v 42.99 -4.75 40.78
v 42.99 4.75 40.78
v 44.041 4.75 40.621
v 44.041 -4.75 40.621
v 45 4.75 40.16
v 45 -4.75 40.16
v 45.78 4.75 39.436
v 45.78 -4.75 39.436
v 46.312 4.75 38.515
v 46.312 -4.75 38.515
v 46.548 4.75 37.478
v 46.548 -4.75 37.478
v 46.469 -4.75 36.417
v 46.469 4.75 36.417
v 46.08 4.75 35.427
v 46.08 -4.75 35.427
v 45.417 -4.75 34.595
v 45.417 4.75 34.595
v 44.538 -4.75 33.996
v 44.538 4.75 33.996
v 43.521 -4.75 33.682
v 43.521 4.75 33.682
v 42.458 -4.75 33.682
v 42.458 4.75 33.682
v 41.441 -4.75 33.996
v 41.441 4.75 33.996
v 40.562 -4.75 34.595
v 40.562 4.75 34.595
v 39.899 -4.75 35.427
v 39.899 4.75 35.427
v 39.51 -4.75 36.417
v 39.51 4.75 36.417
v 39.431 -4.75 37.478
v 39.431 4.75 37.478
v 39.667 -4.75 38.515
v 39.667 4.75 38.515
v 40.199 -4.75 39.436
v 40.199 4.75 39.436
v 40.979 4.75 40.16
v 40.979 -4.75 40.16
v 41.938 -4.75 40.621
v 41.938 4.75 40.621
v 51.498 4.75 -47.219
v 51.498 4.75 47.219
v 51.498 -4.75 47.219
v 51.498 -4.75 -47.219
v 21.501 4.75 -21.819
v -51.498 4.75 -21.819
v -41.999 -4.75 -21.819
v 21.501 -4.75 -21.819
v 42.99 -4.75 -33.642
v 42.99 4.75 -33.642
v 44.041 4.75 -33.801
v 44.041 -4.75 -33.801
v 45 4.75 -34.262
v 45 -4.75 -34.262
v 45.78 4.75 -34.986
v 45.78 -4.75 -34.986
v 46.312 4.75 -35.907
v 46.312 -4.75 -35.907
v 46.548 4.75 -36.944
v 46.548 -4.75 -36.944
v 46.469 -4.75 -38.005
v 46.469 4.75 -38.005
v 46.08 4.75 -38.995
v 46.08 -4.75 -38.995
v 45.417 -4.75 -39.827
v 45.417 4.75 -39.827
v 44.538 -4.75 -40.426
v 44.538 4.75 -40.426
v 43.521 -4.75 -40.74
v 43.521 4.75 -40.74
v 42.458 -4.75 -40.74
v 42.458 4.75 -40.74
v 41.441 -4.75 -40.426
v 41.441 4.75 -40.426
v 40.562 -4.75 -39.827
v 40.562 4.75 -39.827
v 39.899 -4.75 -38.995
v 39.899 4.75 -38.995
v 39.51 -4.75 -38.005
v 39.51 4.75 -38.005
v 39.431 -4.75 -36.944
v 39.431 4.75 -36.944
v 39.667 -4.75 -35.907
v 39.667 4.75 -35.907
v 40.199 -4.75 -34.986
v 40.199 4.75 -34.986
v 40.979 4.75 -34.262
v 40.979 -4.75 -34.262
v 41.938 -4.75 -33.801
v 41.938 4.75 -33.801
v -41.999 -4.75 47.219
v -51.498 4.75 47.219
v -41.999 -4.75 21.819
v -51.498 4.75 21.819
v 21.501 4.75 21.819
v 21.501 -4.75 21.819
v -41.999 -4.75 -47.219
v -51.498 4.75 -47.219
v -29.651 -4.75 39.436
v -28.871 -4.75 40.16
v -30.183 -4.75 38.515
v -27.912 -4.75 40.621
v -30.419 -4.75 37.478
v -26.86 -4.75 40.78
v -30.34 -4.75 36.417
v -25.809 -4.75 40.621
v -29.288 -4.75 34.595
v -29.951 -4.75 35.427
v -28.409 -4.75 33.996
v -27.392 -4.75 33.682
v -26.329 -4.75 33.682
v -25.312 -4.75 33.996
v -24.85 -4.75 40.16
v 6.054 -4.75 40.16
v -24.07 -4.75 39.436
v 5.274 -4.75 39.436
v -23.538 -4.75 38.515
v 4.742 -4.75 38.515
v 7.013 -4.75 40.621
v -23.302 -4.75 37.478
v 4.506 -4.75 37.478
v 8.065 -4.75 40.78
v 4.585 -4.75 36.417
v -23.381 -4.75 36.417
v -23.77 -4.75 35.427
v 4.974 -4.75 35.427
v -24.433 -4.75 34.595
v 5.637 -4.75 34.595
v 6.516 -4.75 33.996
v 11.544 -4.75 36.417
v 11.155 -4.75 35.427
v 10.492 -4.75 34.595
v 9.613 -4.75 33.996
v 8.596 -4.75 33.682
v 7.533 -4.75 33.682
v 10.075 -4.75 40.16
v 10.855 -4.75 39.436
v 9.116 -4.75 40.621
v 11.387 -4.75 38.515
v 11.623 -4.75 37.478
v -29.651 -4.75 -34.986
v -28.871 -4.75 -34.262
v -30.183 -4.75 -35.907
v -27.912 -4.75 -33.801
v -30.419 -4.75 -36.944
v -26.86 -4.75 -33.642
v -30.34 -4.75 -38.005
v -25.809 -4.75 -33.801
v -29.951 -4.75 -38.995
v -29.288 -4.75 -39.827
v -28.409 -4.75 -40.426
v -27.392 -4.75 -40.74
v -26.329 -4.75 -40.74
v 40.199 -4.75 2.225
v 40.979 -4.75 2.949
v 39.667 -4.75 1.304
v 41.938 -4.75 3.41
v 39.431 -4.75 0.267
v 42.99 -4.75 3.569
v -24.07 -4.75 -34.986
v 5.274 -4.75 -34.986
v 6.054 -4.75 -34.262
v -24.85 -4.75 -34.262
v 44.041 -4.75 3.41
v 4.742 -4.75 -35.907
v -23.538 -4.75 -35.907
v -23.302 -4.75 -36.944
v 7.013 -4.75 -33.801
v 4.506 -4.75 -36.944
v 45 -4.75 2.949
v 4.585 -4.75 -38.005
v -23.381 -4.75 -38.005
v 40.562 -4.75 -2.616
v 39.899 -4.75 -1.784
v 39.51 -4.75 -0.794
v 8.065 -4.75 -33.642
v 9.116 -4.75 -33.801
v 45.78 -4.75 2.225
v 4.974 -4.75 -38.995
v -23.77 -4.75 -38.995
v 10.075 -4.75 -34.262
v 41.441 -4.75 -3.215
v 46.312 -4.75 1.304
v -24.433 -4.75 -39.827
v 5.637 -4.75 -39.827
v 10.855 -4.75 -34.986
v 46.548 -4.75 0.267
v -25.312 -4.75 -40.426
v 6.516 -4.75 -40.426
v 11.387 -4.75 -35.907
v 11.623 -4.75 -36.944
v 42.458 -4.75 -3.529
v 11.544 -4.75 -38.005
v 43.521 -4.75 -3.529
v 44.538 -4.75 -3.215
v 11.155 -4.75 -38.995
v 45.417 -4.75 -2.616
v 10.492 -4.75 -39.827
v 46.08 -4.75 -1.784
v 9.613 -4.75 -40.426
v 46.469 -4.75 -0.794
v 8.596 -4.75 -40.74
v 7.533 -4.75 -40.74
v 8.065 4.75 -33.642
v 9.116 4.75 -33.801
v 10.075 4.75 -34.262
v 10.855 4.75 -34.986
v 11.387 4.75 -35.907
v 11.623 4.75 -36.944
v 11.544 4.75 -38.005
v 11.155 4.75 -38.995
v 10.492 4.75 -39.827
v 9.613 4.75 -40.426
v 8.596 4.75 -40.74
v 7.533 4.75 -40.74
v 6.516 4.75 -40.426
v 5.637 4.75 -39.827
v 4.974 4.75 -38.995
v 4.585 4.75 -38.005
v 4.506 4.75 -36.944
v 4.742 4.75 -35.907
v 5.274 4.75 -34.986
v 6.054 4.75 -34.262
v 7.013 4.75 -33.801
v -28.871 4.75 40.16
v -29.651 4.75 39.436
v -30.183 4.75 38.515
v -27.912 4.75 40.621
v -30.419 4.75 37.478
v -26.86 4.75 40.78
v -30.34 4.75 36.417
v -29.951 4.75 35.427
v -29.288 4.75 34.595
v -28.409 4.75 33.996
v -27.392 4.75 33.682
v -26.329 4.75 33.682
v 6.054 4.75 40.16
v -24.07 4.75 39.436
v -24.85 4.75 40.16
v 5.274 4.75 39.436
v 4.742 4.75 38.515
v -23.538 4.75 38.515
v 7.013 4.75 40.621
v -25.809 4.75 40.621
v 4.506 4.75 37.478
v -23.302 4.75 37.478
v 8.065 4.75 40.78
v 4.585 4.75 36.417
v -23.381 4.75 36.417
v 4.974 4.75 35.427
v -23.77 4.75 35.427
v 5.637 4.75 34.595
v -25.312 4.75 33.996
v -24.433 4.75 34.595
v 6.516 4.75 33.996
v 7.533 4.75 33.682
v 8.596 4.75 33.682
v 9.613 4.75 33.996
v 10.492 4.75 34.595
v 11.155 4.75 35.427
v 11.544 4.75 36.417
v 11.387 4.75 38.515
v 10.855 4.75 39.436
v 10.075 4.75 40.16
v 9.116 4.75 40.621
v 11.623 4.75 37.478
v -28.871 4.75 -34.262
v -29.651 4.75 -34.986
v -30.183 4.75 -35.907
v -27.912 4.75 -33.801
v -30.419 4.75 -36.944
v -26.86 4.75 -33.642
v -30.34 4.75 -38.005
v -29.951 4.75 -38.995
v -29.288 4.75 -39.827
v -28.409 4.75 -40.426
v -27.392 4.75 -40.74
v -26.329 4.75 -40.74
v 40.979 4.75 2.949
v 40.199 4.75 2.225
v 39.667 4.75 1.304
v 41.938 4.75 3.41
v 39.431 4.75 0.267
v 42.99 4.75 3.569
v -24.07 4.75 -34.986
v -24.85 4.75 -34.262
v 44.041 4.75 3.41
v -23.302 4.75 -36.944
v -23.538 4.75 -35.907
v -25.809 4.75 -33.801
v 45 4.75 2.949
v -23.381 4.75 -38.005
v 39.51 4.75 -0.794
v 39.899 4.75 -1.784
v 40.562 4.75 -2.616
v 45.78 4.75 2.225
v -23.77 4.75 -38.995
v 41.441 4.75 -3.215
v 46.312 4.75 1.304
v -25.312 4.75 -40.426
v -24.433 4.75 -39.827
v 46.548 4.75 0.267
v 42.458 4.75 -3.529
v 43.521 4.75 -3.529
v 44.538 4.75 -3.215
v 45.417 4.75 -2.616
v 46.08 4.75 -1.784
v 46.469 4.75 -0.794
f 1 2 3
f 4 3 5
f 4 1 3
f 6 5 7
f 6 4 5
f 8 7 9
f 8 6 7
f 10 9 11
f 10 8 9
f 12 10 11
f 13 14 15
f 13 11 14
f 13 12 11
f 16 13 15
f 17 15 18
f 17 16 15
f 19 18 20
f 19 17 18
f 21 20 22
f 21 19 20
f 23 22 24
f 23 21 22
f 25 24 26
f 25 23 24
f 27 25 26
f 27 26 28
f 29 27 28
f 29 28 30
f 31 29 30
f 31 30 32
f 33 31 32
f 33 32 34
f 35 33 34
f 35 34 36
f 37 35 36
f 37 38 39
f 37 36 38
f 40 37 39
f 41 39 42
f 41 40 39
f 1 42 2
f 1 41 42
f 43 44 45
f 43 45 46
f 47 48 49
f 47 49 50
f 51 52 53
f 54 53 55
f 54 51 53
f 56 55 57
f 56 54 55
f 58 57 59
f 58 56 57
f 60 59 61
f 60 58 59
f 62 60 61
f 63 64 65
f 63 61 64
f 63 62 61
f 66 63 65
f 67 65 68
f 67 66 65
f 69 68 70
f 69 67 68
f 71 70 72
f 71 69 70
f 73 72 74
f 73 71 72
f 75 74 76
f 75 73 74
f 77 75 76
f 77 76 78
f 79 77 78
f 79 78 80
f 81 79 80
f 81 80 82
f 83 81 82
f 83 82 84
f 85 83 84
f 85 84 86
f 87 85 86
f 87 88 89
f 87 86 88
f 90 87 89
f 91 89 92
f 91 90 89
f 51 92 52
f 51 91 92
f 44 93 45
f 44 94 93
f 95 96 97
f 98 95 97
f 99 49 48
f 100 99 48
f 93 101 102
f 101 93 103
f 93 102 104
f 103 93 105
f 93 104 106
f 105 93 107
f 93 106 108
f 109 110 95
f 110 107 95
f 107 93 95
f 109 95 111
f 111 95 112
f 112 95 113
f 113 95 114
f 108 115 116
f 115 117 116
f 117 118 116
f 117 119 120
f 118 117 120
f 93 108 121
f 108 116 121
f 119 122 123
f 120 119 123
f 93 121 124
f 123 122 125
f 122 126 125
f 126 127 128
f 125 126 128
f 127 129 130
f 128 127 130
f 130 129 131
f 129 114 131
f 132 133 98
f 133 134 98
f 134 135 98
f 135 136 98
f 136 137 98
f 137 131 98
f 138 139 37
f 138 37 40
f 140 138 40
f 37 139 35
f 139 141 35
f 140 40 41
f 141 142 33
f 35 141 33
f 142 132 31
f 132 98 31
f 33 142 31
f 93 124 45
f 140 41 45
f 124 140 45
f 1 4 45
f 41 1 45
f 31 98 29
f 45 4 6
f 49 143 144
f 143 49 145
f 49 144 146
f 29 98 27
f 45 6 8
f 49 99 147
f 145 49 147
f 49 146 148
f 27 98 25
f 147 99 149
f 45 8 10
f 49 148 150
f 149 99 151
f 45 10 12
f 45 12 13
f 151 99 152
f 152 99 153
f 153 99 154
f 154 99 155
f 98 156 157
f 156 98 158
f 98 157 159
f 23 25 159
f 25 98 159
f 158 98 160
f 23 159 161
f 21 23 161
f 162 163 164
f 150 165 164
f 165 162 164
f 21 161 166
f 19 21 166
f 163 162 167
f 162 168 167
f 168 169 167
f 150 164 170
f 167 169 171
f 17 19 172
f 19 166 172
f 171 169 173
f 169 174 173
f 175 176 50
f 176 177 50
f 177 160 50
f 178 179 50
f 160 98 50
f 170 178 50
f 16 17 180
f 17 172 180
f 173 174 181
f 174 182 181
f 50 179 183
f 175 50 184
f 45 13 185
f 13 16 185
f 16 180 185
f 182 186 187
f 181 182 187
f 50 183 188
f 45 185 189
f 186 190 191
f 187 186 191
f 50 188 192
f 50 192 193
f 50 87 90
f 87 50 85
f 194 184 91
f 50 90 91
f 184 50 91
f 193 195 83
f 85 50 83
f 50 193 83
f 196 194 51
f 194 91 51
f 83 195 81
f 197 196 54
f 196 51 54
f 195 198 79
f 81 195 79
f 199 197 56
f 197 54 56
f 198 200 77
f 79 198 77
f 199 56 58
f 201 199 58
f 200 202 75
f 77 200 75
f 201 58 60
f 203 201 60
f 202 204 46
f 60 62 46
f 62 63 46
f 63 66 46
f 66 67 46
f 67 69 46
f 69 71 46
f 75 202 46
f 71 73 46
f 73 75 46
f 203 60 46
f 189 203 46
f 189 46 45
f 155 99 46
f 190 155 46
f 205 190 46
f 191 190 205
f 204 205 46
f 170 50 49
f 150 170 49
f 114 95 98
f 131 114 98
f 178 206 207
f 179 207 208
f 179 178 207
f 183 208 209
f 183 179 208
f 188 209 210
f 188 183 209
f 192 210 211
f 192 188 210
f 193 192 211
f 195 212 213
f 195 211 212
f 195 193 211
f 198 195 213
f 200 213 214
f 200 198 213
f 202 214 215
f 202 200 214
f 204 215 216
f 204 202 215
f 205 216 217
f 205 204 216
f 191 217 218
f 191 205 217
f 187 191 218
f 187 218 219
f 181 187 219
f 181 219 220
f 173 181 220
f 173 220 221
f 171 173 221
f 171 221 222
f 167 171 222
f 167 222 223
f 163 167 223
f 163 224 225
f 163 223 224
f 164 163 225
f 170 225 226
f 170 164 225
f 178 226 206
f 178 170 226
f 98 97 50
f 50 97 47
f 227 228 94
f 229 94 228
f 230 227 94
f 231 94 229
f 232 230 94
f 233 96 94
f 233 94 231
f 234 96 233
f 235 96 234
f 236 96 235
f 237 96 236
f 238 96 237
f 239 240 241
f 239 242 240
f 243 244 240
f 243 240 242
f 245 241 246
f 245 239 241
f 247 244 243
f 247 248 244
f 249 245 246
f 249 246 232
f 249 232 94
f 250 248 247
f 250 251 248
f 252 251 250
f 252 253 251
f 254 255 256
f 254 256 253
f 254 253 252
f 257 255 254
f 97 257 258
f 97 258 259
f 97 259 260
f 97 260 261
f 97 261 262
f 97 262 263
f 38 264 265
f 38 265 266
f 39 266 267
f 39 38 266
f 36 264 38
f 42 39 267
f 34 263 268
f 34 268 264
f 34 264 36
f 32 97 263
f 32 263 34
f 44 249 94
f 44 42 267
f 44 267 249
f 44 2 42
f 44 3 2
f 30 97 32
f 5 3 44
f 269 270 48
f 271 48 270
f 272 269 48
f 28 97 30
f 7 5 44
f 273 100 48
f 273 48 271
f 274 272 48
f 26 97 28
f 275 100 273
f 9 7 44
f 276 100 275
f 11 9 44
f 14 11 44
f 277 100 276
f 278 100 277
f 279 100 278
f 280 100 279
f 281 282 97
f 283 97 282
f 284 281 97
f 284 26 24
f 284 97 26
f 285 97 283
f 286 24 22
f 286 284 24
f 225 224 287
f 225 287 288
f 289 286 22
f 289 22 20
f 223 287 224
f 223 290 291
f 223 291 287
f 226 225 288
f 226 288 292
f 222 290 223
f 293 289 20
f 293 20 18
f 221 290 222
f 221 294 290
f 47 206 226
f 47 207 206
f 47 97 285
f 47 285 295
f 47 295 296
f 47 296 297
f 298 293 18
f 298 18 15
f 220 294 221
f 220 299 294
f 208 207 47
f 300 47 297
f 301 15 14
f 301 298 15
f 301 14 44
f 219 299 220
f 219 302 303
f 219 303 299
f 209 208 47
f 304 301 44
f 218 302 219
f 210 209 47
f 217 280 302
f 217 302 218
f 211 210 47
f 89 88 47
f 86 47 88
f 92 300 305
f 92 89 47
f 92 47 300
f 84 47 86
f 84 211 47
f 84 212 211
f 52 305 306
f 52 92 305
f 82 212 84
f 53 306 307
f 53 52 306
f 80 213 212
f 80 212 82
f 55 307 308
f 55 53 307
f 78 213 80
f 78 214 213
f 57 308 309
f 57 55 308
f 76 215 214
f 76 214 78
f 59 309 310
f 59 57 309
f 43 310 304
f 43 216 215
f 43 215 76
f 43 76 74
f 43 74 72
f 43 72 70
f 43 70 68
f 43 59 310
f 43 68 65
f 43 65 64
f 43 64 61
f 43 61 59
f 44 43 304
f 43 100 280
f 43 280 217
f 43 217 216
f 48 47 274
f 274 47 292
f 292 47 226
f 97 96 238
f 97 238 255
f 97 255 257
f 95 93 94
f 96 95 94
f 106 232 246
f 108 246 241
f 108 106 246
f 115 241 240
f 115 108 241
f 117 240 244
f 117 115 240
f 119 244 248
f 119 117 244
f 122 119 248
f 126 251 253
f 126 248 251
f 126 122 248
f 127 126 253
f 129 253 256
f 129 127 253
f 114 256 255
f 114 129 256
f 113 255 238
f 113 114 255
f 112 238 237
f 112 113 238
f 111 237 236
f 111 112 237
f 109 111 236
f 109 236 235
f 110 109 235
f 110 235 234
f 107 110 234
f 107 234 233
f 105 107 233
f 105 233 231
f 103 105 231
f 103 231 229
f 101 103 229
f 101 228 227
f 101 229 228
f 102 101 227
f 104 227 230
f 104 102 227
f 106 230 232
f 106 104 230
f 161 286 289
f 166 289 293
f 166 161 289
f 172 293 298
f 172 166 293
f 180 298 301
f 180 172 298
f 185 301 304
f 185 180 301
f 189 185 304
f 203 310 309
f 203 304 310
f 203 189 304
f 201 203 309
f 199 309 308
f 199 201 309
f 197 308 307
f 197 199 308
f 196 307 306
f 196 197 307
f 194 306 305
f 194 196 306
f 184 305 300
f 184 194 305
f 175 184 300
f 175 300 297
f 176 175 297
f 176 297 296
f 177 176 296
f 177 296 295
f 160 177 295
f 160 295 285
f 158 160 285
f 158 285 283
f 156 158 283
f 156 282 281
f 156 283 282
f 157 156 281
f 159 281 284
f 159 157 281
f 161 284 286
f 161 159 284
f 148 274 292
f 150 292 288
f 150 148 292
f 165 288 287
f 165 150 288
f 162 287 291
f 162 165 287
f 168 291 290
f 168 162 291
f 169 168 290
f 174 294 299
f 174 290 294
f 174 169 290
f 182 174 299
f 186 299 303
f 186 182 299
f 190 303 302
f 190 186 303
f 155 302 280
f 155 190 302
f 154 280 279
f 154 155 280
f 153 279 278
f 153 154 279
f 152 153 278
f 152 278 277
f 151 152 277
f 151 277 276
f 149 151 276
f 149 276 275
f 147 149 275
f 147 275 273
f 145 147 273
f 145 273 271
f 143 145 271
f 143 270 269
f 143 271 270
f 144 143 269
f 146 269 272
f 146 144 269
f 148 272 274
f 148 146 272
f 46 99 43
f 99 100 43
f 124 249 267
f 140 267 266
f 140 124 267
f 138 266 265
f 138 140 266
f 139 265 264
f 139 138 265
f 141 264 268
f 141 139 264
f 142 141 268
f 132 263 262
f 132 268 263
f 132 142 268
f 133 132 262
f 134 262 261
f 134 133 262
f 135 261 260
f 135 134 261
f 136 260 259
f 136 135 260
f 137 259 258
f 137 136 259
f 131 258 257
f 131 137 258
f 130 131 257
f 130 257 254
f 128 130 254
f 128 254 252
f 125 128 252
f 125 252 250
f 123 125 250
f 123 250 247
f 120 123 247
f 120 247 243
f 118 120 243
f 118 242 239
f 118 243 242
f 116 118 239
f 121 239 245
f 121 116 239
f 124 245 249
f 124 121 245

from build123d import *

# Parameters (mm, degrees)
SKETCH1_W           = 102.997
SKETCH1_H           = 94.4372
BOSS_EXTRUDE1_DEPTH = 4.7498
CUT_EXTRUDE2_START  = 4.7498
SKETCH2_W           = 175.9966
SKETCH2_H           = 43.6372
CUT_EXTRUDE2_DEPTH  = 75.780166901
CUT_EXTRUDE6_START  = 47.2186
CUT_EXTRUDE6_DEPTH  = 118.248966901
CUT_EXTRUDE8_START  = -4.7498
SKETCH4_R           = 3.5687
CUT_EXTRUDE8_DEPTH  = 75.780166901
CUT_EXTRUDE10_START = -4.7498
SKETCH5_R           = 3.5687
CUT_EXTRUDE10_DEPTH = 75.780166901


with BuildPart() as part:
    # Sketch1 → Boss-Extrude1 (new, symmetric)
    with BuildSketch(Plane(origin=(0, 0, 0), x_dir=(1, 0, 0), z_dir=(0, 1, 0))):
        Rectangle(SKETCH1_W, SKETCH1_H)
    extrude(amount=BOSS_EXTRUDE1_DEPTH, both=True)

    # Sketch2 → Cut-Extrude2 (cut, through all)
    with BuildSketch(Plane(origin=(0, 0, 0), x_dir=(1, 0, 0), z_dir=(0, 1, 0)).offset(CUT_EXTRUDE2_START)):
        with Locations((-66.4972, 0)):
            Rectangle(SKETCH2_W, SKETCH2_H)
    extrude(amount=-CUT_EXTRUDE2_DEPTH, mode=Mode.SUBTRACT)

    # Sketch3 → Cut-Extrude6 (cut, through all)
    with BuildSketch(Plane.XY.offset(CUT_EXTRUDE6_START)):
        Polygon((-154.4955, -14.2494), (-32.4993, -14.2494), (-60.9981, 14.2494), (-154.4955, 14.2494), align=None)
    extrude(amount=-CUT_EXTRUDE6_DEPTH, mode=Mode.SUBTRACT)

    # Sketch4 → Cut-Extrude8 (cut, through all)
    with BuildSketch(Plane(origin=(0, 0, 0), x_dir=(1, 0, 0), z_dir=(0, 1, 0)).offset(CUT_EXTRUDE8_START)):
        with Locations(Location((-26.8605, -37.211, 0), (0, 0, 270))):
            Circle(SKETCH4_R)
        with Locations(Location((8.0645, -37.211, 0), (0, 0, 270))):
            Circle(SKETCH4_R)
        with Locations(Location((42.9895, -37.211, 0), (0, 0, 270))):
            Circle(SKETCH4_R)
        with Locations(Location((-26.8605, 37.211, 0), (0, 0, 270))):
            Circle(SKETCH4_R)
        with Locations(Location((8.0645, 37.211, 0), (0, 0, 270))):
            Circle(SKETCH4_R)
        with Locations(Location((42.9895, 37.211, 0), (0, 0, 270))):
            Circle(SKETCH4_R)
    extrude(amount=CUT_EXTRUDE8_DEPTH, mode=Mode.SUBTRACT)

    # Sketch5 → Cut-Extrude10 (cut, through all)
    with BuildSketch(Plane(origin=(0, 0, 0), x_dir=(1, 0, 0), z_dir=(0, 1, 0)).offset(CUT_EXTRUDE10_START)):
        with Locations(Location((42.9895, 0, 0), (0, 0, 270))):
            Circle(SKETCH5_R)
    extrude(amount=CUT_EXTRUDE10_DEPTH, mode=Mode.SUBTRACT)


solid = part.part
